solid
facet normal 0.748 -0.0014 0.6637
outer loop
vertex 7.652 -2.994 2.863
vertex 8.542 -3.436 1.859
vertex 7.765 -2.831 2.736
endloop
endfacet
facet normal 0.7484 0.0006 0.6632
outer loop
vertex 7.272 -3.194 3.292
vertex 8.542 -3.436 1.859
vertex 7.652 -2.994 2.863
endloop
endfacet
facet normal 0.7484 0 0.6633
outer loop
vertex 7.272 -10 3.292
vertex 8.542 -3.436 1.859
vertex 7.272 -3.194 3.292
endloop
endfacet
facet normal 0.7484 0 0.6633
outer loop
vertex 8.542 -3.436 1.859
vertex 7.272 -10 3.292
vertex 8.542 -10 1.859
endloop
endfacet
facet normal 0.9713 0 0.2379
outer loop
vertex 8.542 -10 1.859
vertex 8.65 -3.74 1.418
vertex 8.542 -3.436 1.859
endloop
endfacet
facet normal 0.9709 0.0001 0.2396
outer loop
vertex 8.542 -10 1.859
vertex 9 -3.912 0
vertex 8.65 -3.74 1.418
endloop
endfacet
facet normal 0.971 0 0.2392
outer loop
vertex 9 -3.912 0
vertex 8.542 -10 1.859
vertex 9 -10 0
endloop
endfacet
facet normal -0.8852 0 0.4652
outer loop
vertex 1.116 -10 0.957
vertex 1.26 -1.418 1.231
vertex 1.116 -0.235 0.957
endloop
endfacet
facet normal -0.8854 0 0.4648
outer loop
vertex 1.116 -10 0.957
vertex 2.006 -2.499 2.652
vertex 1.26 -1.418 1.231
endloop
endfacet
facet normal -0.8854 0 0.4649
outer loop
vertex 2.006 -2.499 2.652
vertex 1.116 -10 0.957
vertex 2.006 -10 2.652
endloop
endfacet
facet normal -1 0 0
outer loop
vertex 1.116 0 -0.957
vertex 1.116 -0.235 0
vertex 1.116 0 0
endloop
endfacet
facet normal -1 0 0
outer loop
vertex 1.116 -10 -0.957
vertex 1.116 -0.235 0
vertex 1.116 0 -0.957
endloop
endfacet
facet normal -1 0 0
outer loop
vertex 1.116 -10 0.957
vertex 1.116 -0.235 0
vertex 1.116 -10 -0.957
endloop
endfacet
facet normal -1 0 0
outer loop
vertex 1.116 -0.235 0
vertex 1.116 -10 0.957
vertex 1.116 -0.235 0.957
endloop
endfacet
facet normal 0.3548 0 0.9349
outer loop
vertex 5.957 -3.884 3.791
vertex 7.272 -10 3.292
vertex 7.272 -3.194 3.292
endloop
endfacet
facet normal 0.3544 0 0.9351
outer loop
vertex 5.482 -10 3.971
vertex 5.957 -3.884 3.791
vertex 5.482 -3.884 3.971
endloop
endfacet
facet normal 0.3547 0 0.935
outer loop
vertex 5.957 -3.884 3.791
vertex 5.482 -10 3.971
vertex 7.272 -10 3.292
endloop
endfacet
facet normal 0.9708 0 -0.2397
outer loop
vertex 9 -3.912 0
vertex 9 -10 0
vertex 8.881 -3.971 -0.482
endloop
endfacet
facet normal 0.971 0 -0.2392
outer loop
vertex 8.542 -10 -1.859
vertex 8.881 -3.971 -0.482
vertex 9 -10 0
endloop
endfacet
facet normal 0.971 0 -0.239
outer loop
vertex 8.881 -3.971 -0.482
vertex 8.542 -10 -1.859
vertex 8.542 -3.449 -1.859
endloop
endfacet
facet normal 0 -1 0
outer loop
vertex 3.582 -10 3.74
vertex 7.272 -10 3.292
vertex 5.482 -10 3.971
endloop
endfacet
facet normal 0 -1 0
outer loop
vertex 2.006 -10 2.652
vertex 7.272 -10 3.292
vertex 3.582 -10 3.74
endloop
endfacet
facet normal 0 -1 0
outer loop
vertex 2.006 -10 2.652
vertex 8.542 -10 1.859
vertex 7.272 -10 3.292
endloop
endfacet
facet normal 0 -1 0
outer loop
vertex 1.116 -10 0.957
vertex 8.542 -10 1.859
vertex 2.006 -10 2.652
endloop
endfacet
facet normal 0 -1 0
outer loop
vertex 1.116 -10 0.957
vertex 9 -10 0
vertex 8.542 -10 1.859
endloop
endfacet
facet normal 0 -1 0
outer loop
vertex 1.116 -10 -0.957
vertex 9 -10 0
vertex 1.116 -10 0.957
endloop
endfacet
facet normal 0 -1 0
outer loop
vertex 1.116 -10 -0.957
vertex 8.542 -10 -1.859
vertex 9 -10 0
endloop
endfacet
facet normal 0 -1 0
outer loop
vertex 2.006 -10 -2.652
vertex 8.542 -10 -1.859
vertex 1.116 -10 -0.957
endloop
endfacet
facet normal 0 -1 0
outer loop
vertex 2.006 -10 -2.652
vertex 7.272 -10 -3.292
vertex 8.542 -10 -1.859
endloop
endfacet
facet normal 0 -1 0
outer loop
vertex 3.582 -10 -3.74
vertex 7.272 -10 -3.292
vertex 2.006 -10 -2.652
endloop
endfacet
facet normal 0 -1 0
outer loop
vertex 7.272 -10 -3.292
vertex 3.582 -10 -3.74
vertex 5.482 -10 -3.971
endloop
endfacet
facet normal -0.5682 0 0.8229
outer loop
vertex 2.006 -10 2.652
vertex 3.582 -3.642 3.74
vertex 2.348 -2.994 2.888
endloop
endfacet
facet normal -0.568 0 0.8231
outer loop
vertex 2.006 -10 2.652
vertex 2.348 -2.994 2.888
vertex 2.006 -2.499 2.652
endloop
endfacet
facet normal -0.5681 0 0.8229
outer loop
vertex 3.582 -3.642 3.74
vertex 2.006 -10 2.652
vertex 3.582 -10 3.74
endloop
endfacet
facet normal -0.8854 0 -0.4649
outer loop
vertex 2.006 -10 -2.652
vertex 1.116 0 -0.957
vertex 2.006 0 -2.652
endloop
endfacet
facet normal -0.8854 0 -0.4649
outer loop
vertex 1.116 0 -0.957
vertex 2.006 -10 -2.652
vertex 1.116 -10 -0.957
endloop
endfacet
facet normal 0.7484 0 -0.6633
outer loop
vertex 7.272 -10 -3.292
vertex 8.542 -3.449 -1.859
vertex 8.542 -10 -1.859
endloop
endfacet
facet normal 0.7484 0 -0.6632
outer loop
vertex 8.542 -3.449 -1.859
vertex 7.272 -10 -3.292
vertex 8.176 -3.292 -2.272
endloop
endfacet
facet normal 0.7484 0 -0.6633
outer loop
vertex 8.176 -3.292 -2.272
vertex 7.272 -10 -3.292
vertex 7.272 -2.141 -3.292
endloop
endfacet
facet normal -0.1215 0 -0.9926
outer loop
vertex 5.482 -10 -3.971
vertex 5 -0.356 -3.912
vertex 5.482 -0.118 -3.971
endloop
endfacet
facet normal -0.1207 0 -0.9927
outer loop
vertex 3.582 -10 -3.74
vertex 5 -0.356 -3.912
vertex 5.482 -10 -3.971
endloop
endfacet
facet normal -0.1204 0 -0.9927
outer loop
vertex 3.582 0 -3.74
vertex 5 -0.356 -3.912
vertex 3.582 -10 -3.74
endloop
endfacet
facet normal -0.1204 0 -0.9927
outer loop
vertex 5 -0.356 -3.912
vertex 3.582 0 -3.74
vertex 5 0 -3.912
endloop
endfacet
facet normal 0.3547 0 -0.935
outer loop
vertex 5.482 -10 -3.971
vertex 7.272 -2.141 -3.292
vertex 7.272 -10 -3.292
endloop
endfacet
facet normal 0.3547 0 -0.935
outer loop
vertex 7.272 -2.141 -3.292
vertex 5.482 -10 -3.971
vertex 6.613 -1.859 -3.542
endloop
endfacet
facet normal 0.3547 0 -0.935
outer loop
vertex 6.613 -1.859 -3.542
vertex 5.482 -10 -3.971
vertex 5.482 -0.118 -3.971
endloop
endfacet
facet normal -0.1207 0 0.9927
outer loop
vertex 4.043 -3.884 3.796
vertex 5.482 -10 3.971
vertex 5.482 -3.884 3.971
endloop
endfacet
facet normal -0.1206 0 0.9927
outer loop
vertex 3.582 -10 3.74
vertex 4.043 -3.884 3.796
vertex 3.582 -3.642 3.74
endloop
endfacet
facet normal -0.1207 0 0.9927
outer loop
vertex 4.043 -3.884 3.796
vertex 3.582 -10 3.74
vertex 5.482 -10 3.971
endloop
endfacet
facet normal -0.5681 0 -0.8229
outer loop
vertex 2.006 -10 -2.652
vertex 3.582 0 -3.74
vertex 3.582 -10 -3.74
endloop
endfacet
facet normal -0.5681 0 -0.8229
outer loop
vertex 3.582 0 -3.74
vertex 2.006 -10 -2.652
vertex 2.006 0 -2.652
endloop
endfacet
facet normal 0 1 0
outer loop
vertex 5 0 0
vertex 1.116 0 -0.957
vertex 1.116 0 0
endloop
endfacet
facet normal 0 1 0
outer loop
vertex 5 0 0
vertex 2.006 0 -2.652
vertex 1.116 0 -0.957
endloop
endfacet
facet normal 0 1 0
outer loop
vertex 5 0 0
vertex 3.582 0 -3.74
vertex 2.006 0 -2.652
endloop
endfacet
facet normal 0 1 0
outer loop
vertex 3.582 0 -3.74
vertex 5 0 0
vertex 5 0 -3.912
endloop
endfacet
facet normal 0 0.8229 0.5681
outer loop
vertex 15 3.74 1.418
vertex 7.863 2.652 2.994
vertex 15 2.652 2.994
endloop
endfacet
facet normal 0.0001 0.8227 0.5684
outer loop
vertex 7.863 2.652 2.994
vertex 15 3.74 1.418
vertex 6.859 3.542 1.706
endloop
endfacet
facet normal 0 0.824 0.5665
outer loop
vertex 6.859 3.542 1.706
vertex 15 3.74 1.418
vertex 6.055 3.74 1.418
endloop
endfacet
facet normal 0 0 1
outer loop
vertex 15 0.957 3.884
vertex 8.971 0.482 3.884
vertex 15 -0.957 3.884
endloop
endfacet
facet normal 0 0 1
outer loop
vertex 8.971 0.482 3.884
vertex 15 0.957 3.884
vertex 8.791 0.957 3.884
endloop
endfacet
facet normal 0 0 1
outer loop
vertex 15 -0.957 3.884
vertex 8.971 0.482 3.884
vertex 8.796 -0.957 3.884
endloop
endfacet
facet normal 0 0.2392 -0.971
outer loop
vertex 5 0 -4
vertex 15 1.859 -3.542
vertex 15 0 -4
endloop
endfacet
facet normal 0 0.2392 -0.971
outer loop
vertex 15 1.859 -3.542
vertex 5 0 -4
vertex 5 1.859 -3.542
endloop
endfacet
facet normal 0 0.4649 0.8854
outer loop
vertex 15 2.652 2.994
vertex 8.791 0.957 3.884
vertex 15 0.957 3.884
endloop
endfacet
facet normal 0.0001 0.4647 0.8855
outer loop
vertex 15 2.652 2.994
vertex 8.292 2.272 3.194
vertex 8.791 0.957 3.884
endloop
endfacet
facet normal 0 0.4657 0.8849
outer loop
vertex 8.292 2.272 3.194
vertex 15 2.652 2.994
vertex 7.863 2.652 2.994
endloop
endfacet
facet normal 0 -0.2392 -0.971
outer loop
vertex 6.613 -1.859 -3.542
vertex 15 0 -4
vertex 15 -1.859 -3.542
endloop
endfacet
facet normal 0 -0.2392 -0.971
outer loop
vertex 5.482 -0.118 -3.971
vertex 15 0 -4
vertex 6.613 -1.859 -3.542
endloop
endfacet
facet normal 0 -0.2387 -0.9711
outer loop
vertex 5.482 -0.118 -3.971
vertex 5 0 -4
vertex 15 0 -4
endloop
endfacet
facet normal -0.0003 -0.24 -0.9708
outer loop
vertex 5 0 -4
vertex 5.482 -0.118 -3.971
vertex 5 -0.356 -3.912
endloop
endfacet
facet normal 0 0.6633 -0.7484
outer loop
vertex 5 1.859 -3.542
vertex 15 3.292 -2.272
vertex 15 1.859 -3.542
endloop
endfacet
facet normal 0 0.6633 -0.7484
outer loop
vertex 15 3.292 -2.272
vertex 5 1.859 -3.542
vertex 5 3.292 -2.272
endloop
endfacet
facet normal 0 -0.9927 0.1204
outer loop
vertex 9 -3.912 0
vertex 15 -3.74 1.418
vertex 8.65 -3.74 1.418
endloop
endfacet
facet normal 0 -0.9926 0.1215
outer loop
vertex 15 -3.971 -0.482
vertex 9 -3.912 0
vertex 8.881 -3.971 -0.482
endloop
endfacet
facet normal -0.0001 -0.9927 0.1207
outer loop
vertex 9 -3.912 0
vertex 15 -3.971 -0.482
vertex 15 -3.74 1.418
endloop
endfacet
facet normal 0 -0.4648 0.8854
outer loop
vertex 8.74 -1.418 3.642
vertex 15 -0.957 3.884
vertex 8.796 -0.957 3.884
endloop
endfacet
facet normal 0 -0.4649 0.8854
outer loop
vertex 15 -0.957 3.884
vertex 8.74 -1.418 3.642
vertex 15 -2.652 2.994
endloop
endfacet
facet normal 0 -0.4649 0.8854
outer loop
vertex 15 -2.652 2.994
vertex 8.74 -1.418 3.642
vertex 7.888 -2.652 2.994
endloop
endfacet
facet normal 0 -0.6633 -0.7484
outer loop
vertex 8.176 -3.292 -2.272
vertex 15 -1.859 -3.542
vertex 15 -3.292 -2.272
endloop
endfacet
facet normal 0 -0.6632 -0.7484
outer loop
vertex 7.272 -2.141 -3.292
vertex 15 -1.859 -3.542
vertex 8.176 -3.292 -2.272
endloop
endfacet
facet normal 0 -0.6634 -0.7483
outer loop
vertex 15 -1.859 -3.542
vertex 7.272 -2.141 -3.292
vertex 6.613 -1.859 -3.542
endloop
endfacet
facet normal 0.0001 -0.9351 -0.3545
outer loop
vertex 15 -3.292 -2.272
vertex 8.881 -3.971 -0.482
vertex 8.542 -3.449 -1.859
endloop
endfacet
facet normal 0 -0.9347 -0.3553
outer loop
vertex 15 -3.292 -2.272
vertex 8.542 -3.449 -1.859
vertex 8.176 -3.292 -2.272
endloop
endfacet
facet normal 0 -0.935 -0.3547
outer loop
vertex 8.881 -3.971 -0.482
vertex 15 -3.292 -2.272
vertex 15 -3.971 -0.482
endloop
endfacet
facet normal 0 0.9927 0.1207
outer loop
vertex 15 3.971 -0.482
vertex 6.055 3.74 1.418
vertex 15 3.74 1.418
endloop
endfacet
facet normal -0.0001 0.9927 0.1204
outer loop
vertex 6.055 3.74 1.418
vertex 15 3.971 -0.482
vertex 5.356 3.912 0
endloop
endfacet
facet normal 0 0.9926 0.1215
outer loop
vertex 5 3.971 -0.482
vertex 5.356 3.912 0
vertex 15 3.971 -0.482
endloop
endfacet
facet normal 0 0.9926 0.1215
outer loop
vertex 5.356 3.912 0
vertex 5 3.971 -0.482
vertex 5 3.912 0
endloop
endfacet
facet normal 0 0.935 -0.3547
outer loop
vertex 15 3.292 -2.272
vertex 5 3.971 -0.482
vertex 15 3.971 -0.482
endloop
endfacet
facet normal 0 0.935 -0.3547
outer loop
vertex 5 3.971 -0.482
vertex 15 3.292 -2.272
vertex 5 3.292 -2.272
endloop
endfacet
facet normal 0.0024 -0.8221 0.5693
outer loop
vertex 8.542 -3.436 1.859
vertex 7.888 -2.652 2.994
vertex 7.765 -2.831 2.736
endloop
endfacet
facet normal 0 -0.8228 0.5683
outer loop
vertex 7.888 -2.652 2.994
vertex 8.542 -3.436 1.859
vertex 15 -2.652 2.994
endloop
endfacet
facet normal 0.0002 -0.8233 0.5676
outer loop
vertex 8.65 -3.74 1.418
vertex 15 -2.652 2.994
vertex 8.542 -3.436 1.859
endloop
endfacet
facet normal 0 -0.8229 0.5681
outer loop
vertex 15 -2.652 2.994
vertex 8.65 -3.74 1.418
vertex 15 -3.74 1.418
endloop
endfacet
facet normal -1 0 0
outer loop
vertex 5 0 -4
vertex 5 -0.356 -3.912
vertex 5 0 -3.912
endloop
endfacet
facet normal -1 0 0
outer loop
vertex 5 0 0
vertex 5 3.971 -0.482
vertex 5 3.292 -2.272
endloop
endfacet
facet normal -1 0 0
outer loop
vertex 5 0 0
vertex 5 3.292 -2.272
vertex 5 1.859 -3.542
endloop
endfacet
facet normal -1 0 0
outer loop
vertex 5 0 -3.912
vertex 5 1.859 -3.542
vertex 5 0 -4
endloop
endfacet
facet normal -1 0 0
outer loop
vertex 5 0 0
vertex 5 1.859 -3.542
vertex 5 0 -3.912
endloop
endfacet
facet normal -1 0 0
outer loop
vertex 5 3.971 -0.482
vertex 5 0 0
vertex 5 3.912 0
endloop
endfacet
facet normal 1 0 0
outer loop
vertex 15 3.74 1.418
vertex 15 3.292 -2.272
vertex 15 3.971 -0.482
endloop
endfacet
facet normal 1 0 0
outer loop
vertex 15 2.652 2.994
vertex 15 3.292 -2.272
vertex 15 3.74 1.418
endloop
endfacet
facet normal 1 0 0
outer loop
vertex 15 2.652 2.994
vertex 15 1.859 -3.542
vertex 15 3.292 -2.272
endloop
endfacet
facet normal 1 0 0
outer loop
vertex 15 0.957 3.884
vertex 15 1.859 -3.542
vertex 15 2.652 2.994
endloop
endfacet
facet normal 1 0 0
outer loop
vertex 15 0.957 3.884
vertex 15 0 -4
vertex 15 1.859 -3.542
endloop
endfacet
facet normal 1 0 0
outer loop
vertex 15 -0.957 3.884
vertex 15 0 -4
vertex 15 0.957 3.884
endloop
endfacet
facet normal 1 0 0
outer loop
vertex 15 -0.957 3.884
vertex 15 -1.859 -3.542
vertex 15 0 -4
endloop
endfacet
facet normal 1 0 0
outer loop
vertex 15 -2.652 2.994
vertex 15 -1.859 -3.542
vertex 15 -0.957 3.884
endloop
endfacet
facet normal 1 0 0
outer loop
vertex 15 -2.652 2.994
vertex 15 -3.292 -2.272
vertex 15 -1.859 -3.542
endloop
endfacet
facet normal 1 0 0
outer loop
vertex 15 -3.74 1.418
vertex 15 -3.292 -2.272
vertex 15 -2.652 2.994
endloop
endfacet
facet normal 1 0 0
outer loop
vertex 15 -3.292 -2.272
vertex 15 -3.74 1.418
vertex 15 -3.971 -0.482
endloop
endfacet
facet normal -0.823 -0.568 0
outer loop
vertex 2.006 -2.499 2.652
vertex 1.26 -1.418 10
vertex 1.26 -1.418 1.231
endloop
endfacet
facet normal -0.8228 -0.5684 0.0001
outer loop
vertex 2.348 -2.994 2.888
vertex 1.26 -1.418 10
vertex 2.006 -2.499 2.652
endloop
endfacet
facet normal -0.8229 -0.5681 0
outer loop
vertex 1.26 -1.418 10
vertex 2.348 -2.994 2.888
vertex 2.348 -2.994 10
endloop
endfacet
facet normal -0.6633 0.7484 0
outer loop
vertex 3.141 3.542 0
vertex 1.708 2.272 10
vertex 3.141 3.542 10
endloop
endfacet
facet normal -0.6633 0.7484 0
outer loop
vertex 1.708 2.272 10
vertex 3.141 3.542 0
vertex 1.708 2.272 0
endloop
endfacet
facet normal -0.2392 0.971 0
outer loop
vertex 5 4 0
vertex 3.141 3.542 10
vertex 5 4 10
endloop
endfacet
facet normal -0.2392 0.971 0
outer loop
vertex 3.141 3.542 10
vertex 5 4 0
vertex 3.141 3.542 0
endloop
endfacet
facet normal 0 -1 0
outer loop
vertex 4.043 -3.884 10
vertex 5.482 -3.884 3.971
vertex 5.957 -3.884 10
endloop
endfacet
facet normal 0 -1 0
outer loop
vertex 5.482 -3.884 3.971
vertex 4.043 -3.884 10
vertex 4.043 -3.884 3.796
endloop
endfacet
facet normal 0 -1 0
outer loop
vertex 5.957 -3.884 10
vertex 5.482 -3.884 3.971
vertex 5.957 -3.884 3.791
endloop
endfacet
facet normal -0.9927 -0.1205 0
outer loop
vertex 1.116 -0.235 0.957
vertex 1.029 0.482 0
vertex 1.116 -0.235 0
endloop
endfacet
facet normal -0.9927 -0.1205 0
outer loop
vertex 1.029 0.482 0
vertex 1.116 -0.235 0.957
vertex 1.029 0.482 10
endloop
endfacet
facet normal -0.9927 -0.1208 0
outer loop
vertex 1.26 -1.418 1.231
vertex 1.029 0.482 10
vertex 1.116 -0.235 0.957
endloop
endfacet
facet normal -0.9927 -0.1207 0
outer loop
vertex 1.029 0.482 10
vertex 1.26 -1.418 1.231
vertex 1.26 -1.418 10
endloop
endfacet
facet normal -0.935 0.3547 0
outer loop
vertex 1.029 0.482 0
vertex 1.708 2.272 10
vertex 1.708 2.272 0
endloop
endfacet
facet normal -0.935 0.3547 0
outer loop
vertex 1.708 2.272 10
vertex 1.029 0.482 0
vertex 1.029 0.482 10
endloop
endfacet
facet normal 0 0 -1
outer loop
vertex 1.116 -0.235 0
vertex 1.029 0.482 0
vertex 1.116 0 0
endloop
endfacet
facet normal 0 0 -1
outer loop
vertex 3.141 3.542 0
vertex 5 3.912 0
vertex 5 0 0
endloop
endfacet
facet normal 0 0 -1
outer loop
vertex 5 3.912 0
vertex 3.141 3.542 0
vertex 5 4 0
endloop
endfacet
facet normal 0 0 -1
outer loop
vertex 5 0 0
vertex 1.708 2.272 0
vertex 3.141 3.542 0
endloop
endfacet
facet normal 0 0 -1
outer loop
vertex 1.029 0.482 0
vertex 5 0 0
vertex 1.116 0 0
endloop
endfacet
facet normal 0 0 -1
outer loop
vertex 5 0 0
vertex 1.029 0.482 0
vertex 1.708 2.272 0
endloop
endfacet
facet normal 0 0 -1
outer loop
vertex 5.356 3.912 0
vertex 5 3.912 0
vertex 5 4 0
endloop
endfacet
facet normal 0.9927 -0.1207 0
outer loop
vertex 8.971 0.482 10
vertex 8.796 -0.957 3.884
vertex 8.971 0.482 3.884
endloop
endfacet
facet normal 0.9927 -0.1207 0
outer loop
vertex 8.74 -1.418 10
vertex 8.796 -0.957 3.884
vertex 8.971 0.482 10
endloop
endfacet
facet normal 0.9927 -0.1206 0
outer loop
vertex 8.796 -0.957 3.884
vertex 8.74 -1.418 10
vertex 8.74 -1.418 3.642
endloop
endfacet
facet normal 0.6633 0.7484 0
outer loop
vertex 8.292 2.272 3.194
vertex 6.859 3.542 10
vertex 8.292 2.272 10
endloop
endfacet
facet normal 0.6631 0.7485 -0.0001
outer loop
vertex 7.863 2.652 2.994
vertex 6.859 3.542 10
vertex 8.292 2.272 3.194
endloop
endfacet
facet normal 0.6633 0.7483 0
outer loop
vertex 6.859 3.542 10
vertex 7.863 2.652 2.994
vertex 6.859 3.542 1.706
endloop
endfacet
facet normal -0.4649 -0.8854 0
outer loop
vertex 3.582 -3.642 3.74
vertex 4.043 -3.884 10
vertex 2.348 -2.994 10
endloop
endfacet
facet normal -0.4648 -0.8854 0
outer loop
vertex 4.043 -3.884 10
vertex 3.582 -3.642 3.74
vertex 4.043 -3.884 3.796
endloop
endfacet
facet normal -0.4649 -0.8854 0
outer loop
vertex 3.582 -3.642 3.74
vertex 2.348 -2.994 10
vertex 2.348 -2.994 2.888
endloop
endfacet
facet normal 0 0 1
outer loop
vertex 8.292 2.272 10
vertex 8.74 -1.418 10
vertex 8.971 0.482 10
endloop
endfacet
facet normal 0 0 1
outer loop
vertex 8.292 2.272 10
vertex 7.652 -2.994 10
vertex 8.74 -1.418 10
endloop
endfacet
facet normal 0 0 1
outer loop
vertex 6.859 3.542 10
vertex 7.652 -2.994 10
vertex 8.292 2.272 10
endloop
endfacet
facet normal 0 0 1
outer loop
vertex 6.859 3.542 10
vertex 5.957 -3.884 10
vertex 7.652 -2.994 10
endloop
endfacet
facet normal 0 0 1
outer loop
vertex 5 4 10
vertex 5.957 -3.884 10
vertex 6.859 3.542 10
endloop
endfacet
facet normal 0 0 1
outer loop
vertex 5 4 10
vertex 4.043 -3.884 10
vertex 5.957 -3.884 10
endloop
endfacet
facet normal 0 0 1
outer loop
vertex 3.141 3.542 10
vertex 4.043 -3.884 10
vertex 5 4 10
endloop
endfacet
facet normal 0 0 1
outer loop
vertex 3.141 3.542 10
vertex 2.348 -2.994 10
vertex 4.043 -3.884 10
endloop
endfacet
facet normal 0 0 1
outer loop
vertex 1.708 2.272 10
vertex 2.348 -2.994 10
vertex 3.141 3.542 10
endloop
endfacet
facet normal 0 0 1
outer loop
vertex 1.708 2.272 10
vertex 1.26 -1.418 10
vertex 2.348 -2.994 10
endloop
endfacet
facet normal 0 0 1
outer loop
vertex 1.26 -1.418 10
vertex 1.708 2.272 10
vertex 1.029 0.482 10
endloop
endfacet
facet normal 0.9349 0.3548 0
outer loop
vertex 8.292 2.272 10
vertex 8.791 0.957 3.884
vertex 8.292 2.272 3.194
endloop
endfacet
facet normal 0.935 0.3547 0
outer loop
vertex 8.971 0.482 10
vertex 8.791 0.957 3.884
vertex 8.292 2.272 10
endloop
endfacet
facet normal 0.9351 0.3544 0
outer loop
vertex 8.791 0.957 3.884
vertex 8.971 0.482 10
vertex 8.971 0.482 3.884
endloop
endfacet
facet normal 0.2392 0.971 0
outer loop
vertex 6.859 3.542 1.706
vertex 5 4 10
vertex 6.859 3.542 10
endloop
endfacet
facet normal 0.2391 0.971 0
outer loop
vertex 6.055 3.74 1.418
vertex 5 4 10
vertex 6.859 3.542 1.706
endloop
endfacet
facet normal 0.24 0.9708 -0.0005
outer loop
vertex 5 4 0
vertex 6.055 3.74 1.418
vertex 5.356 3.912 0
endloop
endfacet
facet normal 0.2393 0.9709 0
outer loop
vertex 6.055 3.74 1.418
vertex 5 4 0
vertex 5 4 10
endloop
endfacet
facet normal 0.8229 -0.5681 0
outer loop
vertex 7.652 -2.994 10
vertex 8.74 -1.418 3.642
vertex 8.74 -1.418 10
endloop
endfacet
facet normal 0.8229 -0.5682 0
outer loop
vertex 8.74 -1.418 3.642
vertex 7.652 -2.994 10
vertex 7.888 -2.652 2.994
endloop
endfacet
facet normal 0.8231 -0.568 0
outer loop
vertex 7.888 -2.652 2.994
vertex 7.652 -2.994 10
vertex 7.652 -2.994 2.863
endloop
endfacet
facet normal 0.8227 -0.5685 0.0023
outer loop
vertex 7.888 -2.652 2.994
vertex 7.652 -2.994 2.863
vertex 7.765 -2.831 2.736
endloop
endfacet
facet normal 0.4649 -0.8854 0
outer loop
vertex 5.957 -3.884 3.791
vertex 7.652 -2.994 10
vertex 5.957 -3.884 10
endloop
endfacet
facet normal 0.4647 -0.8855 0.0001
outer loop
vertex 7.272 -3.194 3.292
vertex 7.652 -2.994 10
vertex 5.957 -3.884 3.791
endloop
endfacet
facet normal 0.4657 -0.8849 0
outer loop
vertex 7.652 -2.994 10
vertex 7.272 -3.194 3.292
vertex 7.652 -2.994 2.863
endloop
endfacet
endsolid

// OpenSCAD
translate([5, 0, 0]) rotate([90, 0, 0]) cylinder(h=10, r1=4, r2=4);
translate([5, 0, 0]) rotate([0, 90, 0]) cylinder(h=10, r1=4, r2=4);
translate([5, 0, 0]) rotate([0, 0, 90]) cylinder(h=10, r1=4, r2=4);
